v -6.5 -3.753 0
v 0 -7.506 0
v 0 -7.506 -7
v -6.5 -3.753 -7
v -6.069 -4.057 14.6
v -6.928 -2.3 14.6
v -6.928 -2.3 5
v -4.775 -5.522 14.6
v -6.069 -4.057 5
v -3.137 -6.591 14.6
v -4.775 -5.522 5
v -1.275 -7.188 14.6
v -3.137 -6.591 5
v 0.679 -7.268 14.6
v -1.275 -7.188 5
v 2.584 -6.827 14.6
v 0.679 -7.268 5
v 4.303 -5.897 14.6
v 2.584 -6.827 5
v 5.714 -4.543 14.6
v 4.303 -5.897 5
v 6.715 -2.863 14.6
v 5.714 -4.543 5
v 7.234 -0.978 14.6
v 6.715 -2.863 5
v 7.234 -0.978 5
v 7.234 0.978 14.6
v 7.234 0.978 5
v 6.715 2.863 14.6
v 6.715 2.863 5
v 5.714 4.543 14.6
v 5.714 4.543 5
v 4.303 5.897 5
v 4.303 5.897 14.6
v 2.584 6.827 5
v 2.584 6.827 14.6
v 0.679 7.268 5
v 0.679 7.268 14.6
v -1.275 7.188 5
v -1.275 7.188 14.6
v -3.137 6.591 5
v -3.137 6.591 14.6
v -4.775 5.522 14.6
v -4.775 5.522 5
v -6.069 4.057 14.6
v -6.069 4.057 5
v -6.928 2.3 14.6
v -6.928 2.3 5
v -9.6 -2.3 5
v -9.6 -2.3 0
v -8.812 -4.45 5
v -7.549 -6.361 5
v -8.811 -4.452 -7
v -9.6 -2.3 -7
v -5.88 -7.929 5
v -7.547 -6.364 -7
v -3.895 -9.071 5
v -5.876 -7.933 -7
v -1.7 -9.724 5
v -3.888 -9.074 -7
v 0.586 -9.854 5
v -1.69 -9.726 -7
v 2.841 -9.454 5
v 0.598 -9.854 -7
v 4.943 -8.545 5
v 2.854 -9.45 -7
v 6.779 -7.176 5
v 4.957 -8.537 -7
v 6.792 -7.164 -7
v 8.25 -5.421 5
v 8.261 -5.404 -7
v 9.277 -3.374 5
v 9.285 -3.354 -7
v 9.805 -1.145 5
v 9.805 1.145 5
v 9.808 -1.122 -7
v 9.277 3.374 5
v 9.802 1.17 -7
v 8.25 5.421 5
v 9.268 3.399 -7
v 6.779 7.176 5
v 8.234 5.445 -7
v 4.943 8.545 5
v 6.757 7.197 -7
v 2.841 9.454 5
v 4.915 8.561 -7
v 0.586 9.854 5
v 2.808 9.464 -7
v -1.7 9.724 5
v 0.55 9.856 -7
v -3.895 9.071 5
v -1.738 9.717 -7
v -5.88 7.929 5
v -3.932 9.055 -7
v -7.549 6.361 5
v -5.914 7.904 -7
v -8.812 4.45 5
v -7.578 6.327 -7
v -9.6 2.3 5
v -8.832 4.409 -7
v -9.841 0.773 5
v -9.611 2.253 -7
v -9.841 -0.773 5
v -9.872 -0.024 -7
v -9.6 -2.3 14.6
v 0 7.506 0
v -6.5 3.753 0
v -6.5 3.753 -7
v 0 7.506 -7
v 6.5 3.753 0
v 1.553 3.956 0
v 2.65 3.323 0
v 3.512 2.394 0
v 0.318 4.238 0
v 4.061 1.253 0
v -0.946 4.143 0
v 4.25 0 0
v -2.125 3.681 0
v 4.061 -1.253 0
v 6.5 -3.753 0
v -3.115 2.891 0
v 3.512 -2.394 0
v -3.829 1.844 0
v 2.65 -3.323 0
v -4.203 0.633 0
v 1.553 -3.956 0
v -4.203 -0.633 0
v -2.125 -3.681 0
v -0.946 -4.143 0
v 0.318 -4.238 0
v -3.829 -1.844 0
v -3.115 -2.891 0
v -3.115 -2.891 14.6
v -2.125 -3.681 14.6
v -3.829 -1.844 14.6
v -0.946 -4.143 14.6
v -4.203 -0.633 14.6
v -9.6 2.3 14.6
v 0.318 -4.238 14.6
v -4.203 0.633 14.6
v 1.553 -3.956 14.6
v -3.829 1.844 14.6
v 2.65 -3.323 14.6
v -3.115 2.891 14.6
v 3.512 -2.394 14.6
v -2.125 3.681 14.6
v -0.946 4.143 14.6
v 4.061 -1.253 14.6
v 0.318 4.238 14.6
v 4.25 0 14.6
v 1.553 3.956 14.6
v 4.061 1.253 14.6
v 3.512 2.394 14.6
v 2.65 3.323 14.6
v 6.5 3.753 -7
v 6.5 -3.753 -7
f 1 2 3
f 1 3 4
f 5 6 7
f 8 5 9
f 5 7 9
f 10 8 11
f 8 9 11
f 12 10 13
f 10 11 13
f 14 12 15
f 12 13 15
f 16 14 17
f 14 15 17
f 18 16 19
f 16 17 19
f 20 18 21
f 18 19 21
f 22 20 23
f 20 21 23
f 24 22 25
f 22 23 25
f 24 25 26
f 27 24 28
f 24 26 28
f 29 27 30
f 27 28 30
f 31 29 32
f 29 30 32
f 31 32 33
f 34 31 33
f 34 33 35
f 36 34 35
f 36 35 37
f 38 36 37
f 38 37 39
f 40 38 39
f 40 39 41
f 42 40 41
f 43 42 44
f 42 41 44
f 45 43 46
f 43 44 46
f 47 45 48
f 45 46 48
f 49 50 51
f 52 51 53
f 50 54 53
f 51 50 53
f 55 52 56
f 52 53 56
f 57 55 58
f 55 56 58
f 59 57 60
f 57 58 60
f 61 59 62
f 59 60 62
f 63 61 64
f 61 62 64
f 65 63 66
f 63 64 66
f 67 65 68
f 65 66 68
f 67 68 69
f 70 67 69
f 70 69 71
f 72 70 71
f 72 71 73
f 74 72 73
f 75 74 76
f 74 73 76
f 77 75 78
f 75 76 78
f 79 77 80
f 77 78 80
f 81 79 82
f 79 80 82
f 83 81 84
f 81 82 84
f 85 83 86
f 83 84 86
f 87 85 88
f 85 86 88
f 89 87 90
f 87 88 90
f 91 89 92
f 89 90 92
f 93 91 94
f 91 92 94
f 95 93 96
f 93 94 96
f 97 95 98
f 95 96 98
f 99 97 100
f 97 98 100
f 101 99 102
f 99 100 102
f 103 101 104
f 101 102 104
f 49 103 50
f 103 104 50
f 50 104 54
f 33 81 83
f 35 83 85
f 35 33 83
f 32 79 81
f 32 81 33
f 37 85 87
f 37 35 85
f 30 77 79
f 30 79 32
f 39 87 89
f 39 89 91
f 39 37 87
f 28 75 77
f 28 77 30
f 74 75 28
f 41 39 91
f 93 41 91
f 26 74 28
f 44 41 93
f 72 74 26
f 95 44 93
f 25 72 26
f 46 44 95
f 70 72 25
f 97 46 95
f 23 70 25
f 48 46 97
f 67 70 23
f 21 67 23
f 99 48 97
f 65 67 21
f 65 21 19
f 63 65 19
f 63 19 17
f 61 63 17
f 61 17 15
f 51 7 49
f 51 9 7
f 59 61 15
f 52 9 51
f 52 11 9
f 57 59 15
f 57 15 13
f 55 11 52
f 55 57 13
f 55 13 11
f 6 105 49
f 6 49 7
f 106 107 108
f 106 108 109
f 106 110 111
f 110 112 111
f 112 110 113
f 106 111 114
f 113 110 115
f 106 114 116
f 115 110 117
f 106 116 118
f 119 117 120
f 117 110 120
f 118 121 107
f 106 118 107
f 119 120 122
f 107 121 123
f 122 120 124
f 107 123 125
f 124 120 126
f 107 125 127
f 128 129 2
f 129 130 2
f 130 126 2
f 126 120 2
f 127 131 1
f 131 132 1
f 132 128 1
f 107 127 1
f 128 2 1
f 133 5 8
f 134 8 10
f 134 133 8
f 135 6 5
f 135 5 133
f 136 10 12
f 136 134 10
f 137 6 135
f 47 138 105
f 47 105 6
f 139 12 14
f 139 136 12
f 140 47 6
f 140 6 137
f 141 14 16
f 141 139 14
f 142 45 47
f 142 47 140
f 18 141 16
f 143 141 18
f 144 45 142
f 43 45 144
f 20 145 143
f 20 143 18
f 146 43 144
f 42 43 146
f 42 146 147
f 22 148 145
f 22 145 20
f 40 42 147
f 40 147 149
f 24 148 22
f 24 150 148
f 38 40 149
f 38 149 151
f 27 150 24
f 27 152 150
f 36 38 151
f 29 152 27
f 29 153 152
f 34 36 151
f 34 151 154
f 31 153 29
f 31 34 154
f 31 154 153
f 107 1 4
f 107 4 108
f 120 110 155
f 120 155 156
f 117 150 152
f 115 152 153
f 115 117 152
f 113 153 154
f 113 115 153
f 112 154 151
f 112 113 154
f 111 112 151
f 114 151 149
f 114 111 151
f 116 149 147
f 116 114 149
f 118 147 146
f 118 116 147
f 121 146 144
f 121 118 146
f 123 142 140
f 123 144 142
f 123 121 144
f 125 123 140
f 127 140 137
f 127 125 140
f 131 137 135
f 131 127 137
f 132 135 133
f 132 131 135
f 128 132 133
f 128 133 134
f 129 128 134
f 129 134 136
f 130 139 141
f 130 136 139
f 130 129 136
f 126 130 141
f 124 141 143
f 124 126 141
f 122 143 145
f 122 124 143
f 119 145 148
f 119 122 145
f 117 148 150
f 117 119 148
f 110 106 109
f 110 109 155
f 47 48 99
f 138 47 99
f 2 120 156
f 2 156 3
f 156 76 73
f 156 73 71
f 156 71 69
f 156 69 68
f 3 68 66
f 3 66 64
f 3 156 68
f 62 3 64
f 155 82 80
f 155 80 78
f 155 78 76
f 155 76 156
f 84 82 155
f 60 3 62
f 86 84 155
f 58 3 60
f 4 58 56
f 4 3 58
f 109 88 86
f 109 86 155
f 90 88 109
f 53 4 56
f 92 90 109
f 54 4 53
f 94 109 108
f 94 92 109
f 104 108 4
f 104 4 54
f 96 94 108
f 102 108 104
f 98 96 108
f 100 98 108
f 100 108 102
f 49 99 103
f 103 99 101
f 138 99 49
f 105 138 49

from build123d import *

# Parameters (mm, degrees)
SKETCH1_R           = 4.25
BOSS_EXTRUDE1_DEPTH = 10
SKETCH2_R           = 9.871676656
BOSS_EXTRUDE2_DEPTH = 7
SKETCH3_R           = 9.871676656
SKETCH3_R_2         = 7.3
BOSS_EXTRUDE3_DEPTH = 5
SKETCH4_R           = 4.25
BOSS_EXTRUDE4_DEPTH = 5
CUT_EXTRUDE2_START  = -0.4
CUT_EXTRUDE2_DEPTH  = 0.4


with BuildPart() as part:
    # Sketch1 → Boss-Extrude1 (new body)
    with BuildSketch(Plane.XY):
        with BuildLine():
            Line((-9.6, -2.3), (-6.92820323, -2.3))
            ThreePointArc((-6.92820323, -2.3), (7.3, 0), (-6.92820323, 2.3))
            Line((-6.92820323, 2.3), (-9.6, 2.3))
            Line((-9.6, 2.3), (-9.6, -2.3))
        make_face()
        Circle(SKETCH1_R, mode=Mode.SUBTRACT)
    extrude(amount=BOSS_EXTRUDE1_DEPTH)

    # Sketch2 → Boss-Extrude2 (add)
    with BuildSketch(Plane(origin=(0, 0, 0), x_dir=(-1, 0, 0), z_dir=(0, 0, -1))):
        Circle(SKETCH2_R)
        Polygon((0, -7.505553499), (6.5, -3.75277675), (6.5, 3.75277675), (0, 7.505553499), (-6.5, 3.75277675), (-6.5, -3.75277675), align=None, mode=Mode.SUBTRACT)
    extrude(amount=BOSS_EXTRUDE2_DEPTH)

    # Sketch3 → Boss-Extrude3 (add)
    with BuildSketch(Plane.XY):
        Circle(SKETCH3_R)
        Circle(SKETCH3_R_2, mode=Mode.SUBTRACT)
    extrude(amount=BOSS_EXTRUDE3_DEPTH)

    # Sketch4 → Boss-Extrude4 (add)
    with BuildSketch(Plane.XY.offset(10)):
        with BuildLine():
            Line((-9.6, -2.3), (-6.92820323, -2.3))
            ThreePointArc((-6.92820323, -2.3), (7.3, 0), (-6.92820323, 2.3))
            Line((-6.92820323, 2.3), (-9.6, 2.3))
            Line((-9.6, 2.3), (-9.6, -2.3))
        make_face()
        Circle(SKETCH4_R, mode=Mode.SUBTRACT)
    extrude(amount=BOSS_EXTRUDE4_DEPTH)

    # Sketch6 → Cut-Extrude2 (cut)
    with BuildSketch(Plane.XY.offset(15).offset(CUT_EXTRUDE2_START)):
        with BuildLine():
            Line((-9.6, 2.3), (-9.6, -2.3))
            Line((-9.6, -2.3), (-6.92820323, -2.3))
            ThreePointArc((-6.92820323, -2.3), (7.3, 0), (-6.92820323, 2.3))
            Line((-6.92820323, 2.3), (-9.6, 2.3))
        make_face()
    extrude(amount=CUT_EXTRUDE2_DEPTH, mode=Mode.SUBTRACT)


solid = part.part
